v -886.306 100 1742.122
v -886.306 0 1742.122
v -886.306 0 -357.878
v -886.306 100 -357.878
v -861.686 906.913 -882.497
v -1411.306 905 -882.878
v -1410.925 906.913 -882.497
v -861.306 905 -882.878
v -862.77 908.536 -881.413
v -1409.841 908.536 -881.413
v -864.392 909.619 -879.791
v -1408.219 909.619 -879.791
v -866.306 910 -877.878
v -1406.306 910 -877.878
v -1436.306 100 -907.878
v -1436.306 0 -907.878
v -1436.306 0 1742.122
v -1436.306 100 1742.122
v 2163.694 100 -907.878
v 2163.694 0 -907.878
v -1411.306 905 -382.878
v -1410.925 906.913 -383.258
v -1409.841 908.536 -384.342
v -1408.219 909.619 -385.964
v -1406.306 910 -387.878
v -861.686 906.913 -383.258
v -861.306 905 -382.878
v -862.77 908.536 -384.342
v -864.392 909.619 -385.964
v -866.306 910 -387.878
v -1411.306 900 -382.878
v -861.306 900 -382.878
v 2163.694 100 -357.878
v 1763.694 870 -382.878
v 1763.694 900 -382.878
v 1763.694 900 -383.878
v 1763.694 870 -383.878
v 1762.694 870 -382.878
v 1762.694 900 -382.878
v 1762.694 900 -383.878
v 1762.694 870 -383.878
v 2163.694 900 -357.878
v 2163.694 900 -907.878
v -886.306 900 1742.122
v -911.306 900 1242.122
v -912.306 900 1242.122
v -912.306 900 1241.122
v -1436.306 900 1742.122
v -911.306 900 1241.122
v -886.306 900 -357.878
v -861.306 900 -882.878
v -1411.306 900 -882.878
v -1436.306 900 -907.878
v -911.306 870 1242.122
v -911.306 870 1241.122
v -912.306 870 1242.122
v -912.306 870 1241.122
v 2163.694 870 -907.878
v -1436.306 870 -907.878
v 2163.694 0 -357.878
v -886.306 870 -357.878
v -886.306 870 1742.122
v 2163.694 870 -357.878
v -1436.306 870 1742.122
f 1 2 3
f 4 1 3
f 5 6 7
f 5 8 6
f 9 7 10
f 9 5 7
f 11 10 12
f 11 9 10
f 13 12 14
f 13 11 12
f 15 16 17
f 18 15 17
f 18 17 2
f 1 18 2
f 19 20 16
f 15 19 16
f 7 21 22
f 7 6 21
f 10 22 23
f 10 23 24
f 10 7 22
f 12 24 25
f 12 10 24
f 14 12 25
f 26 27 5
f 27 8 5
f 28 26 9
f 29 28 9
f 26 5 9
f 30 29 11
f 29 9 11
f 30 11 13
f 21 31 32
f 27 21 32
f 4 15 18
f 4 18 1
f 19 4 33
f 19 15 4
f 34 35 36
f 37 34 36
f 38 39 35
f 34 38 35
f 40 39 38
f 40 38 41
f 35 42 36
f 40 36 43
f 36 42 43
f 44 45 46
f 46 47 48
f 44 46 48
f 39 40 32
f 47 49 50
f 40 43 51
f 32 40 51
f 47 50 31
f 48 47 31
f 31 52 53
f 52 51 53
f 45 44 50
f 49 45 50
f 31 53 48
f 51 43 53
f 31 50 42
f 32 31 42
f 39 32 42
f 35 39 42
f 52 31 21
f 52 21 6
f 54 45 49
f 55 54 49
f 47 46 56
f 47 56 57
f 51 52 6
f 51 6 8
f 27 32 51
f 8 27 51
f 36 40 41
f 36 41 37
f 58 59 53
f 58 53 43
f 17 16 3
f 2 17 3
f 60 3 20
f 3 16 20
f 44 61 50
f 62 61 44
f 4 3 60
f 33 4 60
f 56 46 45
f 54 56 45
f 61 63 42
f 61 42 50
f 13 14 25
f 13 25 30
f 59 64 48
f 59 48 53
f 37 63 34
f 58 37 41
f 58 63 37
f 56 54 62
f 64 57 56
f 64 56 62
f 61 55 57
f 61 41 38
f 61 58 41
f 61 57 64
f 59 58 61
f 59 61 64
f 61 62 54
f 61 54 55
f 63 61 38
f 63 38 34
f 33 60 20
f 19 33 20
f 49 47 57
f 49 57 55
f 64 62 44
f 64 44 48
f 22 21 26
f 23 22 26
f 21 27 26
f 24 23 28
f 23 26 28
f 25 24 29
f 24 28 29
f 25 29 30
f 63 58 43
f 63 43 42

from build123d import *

# Parameters (mm, degrees)
BOSS_EXTRUDE1_DEPTH = 100
BOSS_EXTRUDE8_DEPTH = 30
SKETCH13_W          = 1
SKETCH13_H          = 1
CUT_EXTRUDE1_DEPTH  = 30
SKETCH14_W          = 550
SKETCH14_H          = 500
BOSS_EXTRUDE9_DEPTH = 10
FILLET1_R           = 5


with BuildPart() as part:
    # Sketch1 → Boss-Extrude1 (new body)
    with BuildSketch(Plane(origin=(0, 0, 0), x_dir=(1, 0, 0), z_dir=(0, 1, 0))):
        Polygon((2163.694267516, 907.877525978), (-1436.305732484, 907.877525978), (-1436.305732484, -1742.122474022), (-886.305732484, -1742.122474022), (-886.305732484, 357.877525978), (2163.694267516, 357.877525978), align=None)
    extrude(amount=BOSS_EXTRUDE1_DEPTH)


with BuildPart() as body_2:
    # Sketch11 → Boss-Extrude8 (new body)
    with BuildSketch(Plane(origin=(0, 870, 0), x_dir=(1, 0, 0), z_dir=(0, 1, 0))):
        Polygon((-886.305732484, 357.877525978), (-886.305732484, -1742.122474022), (-1436.305732484, -1742.122474022), (-1436.305732484, 907.877525978), (2163.694267516, 907.877525978), (2163.694267516, 357.877525978), align=None)
    extrude(amount=BOSS_EXTRUDE8_DEPTH)

    # Sketch13 → Cut-Extrude1 (cut)
    with BuildSketch(Plane(origin=(0, 900, 0), x_dir=(1, 0, 0), z_dir=(0, 1, 0))):
        with Locations((-911.805732484, -1241.622474022)):
            Rectangle(SKETCH13_W, SKETCH13_H)
        with Locations((1763.194267516, 383.377525978)):
            Rectangle(SKETCH13_W, SKETCH13_H)
    extrude(amount=-CUT_EXTRUDE1_DEPTH, mode=Mode.SUBTRACT)

    # Sketch14 → Boss-Extrude9 (add)
    with BuildSketch(Plane(origin=(0, 900, 0), x_dir=(1, 0, 0), z_dir=(0, 1, 0))):
        with Locations((-1136.305732484, 632.877525978)):
            Rectangle(SKETCH14_W, SKETCH14_H)
    extrude(amount=BOSS_EXTRUDE9_DEPTH)

    # Fillet1
    fillet1_edges = [body_2.edges().sort_by_distance(p)[0] for p in [
        (-1411.305732484, 910, -632.877525978),
        (-1136.305732484, 910, -382.877525978),
        (-861.305732484, 910, -632.877525978),
        (-1136.305732484, 910, -882.877525978),
    ]]
    fillet(fillet1_edges, radius=FILLET1_R)


solid = Compound([part.part, body_2.part])
